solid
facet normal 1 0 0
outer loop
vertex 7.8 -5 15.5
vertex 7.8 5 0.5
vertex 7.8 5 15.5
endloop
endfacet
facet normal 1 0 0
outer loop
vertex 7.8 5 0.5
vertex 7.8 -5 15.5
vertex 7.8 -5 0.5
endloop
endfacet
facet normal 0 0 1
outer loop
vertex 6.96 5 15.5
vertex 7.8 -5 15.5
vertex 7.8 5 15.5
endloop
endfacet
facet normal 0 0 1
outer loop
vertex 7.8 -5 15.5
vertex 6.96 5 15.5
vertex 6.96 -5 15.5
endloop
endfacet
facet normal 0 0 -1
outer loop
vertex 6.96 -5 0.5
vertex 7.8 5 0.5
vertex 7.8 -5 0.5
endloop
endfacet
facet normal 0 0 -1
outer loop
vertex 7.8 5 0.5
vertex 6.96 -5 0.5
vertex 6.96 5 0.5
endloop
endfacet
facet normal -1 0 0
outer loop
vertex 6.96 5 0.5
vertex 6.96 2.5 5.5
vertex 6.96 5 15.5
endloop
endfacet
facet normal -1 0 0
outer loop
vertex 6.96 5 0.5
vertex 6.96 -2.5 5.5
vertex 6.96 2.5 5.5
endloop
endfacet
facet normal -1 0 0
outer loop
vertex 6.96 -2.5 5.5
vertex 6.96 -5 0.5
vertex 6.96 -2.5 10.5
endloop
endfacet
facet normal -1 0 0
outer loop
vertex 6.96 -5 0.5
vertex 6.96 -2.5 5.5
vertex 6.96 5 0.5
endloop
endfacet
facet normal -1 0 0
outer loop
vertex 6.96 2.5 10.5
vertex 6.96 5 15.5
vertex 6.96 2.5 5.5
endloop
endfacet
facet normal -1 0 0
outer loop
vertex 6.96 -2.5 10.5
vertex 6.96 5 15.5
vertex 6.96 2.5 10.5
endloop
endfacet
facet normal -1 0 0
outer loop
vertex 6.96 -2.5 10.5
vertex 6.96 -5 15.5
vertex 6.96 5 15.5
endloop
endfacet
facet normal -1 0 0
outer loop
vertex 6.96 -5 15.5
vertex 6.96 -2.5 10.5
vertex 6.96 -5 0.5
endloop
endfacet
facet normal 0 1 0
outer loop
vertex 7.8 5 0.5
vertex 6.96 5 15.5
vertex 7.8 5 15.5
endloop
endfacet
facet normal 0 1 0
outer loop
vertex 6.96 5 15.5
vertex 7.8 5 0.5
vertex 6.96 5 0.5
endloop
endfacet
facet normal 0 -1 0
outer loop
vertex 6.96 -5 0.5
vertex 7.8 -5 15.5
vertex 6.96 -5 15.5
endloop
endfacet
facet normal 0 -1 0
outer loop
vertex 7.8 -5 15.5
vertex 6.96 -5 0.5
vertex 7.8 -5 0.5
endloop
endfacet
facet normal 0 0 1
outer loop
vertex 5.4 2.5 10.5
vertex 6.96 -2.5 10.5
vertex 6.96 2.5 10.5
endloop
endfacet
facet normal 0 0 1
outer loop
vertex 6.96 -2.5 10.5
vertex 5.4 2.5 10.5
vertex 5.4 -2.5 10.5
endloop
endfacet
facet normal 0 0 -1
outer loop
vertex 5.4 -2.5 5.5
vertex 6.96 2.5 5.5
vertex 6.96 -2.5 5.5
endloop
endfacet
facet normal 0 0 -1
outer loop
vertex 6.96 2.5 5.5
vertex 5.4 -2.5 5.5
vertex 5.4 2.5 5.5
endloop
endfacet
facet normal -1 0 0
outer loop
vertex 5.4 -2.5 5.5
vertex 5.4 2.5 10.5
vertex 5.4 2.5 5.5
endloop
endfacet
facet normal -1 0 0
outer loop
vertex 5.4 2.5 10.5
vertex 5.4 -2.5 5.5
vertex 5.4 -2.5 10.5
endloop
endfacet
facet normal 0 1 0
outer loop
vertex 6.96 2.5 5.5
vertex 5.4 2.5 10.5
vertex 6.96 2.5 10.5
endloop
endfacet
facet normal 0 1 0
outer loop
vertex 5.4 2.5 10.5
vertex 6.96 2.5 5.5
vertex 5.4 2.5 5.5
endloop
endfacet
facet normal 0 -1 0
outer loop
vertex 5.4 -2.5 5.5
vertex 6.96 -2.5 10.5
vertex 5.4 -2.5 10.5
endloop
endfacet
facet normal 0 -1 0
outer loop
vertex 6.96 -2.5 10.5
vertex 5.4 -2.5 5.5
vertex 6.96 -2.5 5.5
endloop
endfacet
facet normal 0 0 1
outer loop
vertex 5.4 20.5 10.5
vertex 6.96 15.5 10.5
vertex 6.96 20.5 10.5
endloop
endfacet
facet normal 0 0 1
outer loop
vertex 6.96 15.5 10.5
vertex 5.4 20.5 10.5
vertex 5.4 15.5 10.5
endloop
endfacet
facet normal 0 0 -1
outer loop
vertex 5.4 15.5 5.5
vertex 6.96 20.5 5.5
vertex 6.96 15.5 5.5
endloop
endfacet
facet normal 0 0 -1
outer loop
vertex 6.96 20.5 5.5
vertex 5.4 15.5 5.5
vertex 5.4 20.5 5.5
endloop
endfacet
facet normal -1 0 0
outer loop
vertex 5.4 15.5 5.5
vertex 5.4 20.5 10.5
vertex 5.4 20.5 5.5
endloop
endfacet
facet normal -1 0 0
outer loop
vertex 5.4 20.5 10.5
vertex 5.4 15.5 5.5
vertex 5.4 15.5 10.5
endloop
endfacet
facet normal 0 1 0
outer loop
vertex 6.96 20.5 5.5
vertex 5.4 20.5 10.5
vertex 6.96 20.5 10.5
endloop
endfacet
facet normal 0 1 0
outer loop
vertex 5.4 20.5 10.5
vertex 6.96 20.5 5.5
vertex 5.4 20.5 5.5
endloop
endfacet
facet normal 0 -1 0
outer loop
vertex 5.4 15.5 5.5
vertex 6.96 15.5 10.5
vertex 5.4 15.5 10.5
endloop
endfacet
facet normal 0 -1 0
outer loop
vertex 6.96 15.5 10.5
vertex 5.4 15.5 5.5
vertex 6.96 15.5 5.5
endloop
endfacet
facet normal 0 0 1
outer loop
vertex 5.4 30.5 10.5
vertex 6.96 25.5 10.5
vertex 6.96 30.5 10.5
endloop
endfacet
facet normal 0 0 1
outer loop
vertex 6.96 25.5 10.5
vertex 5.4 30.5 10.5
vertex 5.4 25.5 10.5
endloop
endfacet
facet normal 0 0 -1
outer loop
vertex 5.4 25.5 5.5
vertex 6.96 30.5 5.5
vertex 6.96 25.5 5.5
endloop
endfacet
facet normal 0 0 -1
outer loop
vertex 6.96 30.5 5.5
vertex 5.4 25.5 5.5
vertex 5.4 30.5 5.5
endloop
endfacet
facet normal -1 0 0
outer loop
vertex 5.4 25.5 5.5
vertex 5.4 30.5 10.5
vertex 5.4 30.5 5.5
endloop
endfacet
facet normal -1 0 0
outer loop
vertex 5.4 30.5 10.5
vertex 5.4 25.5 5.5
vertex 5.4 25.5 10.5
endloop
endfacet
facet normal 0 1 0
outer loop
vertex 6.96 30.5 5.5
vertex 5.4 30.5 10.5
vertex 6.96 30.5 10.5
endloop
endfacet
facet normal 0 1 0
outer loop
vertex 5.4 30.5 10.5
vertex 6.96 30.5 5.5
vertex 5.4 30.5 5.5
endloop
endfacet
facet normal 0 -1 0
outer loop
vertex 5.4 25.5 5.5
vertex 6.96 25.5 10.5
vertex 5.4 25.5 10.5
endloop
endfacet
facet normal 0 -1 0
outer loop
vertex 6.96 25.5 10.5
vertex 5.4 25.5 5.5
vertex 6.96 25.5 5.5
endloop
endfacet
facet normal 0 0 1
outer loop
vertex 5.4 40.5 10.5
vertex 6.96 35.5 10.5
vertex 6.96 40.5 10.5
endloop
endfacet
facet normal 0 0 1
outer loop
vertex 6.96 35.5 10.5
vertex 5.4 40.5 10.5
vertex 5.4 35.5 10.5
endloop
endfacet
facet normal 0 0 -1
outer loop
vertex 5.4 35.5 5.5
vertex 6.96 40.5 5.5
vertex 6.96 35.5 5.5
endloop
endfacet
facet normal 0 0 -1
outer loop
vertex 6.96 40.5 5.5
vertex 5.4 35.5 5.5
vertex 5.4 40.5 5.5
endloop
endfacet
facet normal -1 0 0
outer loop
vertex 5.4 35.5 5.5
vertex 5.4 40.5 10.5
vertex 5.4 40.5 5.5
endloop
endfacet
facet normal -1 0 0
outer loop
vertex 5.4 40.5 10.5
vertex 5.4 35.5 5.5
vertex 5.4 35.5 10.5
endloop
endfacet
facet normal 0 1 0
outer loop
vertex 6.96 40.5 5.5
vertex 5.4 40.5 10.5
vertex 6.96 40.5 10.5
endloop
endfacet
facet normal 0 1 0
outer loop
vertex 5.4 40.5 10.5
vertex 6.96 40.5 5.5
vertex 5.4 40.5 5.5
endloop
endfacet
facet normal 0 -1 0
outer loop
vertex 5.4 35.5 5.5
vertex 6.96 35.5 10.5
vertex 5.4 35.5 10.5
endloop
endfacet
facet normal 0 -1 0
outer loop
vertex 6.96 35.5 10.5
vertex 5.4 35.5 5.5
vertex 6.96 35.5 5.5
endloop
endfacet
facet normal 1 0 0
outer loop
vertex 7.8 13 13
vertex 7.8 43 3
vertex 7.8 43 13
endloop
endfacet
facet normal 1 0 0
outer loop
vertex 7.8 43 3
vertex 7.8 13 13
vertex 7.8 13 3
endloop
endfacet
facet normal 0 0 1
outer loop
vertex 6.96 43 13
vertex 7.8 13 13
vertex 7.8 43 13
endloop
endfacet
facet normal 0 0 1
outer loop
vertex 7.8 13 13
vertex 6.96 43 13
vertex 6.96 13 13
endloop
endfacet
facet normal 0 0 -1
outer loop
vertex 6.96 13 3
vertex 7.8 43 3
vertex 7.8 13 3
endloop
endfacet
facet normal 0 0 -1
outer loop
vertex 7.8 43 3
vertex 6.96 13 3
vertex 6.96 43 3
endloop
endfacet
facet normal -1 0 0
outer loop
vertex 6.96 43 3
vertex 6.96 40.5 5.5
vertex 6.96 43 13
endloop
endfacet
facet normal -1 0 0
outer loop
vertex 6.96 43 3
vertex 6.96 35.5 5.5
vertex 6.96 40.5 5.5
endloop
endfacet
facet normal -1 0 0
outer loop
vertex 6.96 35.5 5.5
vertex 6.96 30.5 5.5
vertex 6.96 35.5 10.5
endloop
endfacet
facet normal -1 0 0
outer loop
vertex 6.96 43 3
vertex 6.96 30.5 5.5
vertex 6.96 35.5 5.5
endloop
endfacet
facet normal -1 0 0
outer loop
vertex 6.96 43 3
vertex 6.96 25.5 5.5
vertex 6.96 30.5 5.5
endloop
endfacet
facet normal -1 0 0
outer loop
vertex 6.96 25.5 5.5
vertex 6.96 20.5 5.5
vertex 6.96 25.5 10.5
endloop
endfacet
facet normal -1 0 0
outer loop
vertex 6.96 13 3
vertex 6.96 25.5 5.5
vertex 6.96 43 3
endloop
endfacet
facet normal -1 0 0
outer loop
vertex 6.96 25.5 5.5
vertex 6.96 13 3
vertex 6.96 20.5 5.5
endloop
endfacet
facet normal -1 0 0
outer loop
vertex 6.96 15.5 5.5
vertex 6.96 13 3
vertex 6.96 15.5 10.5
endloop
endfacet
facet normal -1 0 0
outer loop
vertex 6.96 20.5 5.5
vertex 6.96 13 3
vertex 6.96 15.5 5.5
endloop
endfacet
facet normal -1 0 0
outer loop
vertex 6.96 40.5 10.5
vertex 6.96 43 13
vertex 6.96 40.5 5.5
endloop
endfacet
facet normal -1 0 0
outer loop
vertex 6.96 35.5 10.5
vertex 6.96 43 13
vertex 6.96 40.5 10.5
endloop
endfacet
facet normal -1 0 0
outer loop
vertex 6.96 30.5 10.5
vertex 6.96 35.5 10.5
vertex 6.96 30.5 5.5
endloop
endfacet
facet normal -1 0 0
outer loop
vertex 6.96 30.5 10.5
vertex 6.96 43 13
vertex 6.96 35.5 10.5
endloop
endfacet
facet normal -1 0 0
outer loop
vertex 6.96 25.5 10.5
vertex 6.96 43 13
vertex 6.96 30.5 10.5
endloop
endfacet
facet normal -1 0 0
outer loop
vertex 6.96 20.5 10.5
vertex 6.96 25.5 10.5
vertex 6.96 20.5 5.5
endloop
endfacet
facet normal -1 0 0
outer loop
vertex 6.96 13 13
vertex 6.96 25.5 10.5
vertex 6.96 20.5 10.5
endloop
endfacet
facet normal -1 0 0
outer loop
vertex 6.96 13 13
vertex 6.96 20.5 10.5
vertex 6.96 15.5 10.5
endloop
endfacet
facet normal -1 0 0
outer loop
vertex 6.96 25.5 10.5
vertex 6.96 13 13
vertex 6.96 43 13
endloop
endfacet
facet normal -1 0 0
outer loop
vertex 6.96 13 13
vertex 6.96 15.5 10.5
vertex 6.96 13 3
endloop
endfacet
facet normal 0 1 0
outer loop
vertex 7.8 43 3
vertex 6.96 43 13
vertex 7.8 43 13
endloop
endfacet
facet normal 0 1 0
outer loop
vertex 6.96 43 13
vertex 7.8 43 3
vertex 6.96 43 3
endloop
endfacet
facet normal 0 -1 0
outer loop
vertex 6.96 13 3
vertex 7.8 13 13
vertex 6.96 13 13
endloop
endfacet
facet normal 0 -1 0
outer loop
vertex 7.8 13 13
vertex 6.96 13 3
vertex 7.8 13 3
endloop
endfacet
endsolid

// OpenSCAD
// The strip pieces as solids, for the catalogue (the Ghost is % so it never renders).
// layout "station": as views/station.scad; "fit": n pieces at the fit piece's pitch.
use <../neopixel-strip.scad>

axisZ  = 8;
layout = "station";
n      = 4;
pitch  = 18;

if (layout == "fit")
  for (i = [0 : n - 1]) translate([0, i*pitch, 0]) npxSolid(axisZ, length = 15, clearance = [0.2, 0.4, 0.3, 0.3][i]);
else
{
  npxSolid(axisZ, length = 15);
  translate([0, 18, 0]) npxSolid(axisZ, n = 3, along = true);
}
